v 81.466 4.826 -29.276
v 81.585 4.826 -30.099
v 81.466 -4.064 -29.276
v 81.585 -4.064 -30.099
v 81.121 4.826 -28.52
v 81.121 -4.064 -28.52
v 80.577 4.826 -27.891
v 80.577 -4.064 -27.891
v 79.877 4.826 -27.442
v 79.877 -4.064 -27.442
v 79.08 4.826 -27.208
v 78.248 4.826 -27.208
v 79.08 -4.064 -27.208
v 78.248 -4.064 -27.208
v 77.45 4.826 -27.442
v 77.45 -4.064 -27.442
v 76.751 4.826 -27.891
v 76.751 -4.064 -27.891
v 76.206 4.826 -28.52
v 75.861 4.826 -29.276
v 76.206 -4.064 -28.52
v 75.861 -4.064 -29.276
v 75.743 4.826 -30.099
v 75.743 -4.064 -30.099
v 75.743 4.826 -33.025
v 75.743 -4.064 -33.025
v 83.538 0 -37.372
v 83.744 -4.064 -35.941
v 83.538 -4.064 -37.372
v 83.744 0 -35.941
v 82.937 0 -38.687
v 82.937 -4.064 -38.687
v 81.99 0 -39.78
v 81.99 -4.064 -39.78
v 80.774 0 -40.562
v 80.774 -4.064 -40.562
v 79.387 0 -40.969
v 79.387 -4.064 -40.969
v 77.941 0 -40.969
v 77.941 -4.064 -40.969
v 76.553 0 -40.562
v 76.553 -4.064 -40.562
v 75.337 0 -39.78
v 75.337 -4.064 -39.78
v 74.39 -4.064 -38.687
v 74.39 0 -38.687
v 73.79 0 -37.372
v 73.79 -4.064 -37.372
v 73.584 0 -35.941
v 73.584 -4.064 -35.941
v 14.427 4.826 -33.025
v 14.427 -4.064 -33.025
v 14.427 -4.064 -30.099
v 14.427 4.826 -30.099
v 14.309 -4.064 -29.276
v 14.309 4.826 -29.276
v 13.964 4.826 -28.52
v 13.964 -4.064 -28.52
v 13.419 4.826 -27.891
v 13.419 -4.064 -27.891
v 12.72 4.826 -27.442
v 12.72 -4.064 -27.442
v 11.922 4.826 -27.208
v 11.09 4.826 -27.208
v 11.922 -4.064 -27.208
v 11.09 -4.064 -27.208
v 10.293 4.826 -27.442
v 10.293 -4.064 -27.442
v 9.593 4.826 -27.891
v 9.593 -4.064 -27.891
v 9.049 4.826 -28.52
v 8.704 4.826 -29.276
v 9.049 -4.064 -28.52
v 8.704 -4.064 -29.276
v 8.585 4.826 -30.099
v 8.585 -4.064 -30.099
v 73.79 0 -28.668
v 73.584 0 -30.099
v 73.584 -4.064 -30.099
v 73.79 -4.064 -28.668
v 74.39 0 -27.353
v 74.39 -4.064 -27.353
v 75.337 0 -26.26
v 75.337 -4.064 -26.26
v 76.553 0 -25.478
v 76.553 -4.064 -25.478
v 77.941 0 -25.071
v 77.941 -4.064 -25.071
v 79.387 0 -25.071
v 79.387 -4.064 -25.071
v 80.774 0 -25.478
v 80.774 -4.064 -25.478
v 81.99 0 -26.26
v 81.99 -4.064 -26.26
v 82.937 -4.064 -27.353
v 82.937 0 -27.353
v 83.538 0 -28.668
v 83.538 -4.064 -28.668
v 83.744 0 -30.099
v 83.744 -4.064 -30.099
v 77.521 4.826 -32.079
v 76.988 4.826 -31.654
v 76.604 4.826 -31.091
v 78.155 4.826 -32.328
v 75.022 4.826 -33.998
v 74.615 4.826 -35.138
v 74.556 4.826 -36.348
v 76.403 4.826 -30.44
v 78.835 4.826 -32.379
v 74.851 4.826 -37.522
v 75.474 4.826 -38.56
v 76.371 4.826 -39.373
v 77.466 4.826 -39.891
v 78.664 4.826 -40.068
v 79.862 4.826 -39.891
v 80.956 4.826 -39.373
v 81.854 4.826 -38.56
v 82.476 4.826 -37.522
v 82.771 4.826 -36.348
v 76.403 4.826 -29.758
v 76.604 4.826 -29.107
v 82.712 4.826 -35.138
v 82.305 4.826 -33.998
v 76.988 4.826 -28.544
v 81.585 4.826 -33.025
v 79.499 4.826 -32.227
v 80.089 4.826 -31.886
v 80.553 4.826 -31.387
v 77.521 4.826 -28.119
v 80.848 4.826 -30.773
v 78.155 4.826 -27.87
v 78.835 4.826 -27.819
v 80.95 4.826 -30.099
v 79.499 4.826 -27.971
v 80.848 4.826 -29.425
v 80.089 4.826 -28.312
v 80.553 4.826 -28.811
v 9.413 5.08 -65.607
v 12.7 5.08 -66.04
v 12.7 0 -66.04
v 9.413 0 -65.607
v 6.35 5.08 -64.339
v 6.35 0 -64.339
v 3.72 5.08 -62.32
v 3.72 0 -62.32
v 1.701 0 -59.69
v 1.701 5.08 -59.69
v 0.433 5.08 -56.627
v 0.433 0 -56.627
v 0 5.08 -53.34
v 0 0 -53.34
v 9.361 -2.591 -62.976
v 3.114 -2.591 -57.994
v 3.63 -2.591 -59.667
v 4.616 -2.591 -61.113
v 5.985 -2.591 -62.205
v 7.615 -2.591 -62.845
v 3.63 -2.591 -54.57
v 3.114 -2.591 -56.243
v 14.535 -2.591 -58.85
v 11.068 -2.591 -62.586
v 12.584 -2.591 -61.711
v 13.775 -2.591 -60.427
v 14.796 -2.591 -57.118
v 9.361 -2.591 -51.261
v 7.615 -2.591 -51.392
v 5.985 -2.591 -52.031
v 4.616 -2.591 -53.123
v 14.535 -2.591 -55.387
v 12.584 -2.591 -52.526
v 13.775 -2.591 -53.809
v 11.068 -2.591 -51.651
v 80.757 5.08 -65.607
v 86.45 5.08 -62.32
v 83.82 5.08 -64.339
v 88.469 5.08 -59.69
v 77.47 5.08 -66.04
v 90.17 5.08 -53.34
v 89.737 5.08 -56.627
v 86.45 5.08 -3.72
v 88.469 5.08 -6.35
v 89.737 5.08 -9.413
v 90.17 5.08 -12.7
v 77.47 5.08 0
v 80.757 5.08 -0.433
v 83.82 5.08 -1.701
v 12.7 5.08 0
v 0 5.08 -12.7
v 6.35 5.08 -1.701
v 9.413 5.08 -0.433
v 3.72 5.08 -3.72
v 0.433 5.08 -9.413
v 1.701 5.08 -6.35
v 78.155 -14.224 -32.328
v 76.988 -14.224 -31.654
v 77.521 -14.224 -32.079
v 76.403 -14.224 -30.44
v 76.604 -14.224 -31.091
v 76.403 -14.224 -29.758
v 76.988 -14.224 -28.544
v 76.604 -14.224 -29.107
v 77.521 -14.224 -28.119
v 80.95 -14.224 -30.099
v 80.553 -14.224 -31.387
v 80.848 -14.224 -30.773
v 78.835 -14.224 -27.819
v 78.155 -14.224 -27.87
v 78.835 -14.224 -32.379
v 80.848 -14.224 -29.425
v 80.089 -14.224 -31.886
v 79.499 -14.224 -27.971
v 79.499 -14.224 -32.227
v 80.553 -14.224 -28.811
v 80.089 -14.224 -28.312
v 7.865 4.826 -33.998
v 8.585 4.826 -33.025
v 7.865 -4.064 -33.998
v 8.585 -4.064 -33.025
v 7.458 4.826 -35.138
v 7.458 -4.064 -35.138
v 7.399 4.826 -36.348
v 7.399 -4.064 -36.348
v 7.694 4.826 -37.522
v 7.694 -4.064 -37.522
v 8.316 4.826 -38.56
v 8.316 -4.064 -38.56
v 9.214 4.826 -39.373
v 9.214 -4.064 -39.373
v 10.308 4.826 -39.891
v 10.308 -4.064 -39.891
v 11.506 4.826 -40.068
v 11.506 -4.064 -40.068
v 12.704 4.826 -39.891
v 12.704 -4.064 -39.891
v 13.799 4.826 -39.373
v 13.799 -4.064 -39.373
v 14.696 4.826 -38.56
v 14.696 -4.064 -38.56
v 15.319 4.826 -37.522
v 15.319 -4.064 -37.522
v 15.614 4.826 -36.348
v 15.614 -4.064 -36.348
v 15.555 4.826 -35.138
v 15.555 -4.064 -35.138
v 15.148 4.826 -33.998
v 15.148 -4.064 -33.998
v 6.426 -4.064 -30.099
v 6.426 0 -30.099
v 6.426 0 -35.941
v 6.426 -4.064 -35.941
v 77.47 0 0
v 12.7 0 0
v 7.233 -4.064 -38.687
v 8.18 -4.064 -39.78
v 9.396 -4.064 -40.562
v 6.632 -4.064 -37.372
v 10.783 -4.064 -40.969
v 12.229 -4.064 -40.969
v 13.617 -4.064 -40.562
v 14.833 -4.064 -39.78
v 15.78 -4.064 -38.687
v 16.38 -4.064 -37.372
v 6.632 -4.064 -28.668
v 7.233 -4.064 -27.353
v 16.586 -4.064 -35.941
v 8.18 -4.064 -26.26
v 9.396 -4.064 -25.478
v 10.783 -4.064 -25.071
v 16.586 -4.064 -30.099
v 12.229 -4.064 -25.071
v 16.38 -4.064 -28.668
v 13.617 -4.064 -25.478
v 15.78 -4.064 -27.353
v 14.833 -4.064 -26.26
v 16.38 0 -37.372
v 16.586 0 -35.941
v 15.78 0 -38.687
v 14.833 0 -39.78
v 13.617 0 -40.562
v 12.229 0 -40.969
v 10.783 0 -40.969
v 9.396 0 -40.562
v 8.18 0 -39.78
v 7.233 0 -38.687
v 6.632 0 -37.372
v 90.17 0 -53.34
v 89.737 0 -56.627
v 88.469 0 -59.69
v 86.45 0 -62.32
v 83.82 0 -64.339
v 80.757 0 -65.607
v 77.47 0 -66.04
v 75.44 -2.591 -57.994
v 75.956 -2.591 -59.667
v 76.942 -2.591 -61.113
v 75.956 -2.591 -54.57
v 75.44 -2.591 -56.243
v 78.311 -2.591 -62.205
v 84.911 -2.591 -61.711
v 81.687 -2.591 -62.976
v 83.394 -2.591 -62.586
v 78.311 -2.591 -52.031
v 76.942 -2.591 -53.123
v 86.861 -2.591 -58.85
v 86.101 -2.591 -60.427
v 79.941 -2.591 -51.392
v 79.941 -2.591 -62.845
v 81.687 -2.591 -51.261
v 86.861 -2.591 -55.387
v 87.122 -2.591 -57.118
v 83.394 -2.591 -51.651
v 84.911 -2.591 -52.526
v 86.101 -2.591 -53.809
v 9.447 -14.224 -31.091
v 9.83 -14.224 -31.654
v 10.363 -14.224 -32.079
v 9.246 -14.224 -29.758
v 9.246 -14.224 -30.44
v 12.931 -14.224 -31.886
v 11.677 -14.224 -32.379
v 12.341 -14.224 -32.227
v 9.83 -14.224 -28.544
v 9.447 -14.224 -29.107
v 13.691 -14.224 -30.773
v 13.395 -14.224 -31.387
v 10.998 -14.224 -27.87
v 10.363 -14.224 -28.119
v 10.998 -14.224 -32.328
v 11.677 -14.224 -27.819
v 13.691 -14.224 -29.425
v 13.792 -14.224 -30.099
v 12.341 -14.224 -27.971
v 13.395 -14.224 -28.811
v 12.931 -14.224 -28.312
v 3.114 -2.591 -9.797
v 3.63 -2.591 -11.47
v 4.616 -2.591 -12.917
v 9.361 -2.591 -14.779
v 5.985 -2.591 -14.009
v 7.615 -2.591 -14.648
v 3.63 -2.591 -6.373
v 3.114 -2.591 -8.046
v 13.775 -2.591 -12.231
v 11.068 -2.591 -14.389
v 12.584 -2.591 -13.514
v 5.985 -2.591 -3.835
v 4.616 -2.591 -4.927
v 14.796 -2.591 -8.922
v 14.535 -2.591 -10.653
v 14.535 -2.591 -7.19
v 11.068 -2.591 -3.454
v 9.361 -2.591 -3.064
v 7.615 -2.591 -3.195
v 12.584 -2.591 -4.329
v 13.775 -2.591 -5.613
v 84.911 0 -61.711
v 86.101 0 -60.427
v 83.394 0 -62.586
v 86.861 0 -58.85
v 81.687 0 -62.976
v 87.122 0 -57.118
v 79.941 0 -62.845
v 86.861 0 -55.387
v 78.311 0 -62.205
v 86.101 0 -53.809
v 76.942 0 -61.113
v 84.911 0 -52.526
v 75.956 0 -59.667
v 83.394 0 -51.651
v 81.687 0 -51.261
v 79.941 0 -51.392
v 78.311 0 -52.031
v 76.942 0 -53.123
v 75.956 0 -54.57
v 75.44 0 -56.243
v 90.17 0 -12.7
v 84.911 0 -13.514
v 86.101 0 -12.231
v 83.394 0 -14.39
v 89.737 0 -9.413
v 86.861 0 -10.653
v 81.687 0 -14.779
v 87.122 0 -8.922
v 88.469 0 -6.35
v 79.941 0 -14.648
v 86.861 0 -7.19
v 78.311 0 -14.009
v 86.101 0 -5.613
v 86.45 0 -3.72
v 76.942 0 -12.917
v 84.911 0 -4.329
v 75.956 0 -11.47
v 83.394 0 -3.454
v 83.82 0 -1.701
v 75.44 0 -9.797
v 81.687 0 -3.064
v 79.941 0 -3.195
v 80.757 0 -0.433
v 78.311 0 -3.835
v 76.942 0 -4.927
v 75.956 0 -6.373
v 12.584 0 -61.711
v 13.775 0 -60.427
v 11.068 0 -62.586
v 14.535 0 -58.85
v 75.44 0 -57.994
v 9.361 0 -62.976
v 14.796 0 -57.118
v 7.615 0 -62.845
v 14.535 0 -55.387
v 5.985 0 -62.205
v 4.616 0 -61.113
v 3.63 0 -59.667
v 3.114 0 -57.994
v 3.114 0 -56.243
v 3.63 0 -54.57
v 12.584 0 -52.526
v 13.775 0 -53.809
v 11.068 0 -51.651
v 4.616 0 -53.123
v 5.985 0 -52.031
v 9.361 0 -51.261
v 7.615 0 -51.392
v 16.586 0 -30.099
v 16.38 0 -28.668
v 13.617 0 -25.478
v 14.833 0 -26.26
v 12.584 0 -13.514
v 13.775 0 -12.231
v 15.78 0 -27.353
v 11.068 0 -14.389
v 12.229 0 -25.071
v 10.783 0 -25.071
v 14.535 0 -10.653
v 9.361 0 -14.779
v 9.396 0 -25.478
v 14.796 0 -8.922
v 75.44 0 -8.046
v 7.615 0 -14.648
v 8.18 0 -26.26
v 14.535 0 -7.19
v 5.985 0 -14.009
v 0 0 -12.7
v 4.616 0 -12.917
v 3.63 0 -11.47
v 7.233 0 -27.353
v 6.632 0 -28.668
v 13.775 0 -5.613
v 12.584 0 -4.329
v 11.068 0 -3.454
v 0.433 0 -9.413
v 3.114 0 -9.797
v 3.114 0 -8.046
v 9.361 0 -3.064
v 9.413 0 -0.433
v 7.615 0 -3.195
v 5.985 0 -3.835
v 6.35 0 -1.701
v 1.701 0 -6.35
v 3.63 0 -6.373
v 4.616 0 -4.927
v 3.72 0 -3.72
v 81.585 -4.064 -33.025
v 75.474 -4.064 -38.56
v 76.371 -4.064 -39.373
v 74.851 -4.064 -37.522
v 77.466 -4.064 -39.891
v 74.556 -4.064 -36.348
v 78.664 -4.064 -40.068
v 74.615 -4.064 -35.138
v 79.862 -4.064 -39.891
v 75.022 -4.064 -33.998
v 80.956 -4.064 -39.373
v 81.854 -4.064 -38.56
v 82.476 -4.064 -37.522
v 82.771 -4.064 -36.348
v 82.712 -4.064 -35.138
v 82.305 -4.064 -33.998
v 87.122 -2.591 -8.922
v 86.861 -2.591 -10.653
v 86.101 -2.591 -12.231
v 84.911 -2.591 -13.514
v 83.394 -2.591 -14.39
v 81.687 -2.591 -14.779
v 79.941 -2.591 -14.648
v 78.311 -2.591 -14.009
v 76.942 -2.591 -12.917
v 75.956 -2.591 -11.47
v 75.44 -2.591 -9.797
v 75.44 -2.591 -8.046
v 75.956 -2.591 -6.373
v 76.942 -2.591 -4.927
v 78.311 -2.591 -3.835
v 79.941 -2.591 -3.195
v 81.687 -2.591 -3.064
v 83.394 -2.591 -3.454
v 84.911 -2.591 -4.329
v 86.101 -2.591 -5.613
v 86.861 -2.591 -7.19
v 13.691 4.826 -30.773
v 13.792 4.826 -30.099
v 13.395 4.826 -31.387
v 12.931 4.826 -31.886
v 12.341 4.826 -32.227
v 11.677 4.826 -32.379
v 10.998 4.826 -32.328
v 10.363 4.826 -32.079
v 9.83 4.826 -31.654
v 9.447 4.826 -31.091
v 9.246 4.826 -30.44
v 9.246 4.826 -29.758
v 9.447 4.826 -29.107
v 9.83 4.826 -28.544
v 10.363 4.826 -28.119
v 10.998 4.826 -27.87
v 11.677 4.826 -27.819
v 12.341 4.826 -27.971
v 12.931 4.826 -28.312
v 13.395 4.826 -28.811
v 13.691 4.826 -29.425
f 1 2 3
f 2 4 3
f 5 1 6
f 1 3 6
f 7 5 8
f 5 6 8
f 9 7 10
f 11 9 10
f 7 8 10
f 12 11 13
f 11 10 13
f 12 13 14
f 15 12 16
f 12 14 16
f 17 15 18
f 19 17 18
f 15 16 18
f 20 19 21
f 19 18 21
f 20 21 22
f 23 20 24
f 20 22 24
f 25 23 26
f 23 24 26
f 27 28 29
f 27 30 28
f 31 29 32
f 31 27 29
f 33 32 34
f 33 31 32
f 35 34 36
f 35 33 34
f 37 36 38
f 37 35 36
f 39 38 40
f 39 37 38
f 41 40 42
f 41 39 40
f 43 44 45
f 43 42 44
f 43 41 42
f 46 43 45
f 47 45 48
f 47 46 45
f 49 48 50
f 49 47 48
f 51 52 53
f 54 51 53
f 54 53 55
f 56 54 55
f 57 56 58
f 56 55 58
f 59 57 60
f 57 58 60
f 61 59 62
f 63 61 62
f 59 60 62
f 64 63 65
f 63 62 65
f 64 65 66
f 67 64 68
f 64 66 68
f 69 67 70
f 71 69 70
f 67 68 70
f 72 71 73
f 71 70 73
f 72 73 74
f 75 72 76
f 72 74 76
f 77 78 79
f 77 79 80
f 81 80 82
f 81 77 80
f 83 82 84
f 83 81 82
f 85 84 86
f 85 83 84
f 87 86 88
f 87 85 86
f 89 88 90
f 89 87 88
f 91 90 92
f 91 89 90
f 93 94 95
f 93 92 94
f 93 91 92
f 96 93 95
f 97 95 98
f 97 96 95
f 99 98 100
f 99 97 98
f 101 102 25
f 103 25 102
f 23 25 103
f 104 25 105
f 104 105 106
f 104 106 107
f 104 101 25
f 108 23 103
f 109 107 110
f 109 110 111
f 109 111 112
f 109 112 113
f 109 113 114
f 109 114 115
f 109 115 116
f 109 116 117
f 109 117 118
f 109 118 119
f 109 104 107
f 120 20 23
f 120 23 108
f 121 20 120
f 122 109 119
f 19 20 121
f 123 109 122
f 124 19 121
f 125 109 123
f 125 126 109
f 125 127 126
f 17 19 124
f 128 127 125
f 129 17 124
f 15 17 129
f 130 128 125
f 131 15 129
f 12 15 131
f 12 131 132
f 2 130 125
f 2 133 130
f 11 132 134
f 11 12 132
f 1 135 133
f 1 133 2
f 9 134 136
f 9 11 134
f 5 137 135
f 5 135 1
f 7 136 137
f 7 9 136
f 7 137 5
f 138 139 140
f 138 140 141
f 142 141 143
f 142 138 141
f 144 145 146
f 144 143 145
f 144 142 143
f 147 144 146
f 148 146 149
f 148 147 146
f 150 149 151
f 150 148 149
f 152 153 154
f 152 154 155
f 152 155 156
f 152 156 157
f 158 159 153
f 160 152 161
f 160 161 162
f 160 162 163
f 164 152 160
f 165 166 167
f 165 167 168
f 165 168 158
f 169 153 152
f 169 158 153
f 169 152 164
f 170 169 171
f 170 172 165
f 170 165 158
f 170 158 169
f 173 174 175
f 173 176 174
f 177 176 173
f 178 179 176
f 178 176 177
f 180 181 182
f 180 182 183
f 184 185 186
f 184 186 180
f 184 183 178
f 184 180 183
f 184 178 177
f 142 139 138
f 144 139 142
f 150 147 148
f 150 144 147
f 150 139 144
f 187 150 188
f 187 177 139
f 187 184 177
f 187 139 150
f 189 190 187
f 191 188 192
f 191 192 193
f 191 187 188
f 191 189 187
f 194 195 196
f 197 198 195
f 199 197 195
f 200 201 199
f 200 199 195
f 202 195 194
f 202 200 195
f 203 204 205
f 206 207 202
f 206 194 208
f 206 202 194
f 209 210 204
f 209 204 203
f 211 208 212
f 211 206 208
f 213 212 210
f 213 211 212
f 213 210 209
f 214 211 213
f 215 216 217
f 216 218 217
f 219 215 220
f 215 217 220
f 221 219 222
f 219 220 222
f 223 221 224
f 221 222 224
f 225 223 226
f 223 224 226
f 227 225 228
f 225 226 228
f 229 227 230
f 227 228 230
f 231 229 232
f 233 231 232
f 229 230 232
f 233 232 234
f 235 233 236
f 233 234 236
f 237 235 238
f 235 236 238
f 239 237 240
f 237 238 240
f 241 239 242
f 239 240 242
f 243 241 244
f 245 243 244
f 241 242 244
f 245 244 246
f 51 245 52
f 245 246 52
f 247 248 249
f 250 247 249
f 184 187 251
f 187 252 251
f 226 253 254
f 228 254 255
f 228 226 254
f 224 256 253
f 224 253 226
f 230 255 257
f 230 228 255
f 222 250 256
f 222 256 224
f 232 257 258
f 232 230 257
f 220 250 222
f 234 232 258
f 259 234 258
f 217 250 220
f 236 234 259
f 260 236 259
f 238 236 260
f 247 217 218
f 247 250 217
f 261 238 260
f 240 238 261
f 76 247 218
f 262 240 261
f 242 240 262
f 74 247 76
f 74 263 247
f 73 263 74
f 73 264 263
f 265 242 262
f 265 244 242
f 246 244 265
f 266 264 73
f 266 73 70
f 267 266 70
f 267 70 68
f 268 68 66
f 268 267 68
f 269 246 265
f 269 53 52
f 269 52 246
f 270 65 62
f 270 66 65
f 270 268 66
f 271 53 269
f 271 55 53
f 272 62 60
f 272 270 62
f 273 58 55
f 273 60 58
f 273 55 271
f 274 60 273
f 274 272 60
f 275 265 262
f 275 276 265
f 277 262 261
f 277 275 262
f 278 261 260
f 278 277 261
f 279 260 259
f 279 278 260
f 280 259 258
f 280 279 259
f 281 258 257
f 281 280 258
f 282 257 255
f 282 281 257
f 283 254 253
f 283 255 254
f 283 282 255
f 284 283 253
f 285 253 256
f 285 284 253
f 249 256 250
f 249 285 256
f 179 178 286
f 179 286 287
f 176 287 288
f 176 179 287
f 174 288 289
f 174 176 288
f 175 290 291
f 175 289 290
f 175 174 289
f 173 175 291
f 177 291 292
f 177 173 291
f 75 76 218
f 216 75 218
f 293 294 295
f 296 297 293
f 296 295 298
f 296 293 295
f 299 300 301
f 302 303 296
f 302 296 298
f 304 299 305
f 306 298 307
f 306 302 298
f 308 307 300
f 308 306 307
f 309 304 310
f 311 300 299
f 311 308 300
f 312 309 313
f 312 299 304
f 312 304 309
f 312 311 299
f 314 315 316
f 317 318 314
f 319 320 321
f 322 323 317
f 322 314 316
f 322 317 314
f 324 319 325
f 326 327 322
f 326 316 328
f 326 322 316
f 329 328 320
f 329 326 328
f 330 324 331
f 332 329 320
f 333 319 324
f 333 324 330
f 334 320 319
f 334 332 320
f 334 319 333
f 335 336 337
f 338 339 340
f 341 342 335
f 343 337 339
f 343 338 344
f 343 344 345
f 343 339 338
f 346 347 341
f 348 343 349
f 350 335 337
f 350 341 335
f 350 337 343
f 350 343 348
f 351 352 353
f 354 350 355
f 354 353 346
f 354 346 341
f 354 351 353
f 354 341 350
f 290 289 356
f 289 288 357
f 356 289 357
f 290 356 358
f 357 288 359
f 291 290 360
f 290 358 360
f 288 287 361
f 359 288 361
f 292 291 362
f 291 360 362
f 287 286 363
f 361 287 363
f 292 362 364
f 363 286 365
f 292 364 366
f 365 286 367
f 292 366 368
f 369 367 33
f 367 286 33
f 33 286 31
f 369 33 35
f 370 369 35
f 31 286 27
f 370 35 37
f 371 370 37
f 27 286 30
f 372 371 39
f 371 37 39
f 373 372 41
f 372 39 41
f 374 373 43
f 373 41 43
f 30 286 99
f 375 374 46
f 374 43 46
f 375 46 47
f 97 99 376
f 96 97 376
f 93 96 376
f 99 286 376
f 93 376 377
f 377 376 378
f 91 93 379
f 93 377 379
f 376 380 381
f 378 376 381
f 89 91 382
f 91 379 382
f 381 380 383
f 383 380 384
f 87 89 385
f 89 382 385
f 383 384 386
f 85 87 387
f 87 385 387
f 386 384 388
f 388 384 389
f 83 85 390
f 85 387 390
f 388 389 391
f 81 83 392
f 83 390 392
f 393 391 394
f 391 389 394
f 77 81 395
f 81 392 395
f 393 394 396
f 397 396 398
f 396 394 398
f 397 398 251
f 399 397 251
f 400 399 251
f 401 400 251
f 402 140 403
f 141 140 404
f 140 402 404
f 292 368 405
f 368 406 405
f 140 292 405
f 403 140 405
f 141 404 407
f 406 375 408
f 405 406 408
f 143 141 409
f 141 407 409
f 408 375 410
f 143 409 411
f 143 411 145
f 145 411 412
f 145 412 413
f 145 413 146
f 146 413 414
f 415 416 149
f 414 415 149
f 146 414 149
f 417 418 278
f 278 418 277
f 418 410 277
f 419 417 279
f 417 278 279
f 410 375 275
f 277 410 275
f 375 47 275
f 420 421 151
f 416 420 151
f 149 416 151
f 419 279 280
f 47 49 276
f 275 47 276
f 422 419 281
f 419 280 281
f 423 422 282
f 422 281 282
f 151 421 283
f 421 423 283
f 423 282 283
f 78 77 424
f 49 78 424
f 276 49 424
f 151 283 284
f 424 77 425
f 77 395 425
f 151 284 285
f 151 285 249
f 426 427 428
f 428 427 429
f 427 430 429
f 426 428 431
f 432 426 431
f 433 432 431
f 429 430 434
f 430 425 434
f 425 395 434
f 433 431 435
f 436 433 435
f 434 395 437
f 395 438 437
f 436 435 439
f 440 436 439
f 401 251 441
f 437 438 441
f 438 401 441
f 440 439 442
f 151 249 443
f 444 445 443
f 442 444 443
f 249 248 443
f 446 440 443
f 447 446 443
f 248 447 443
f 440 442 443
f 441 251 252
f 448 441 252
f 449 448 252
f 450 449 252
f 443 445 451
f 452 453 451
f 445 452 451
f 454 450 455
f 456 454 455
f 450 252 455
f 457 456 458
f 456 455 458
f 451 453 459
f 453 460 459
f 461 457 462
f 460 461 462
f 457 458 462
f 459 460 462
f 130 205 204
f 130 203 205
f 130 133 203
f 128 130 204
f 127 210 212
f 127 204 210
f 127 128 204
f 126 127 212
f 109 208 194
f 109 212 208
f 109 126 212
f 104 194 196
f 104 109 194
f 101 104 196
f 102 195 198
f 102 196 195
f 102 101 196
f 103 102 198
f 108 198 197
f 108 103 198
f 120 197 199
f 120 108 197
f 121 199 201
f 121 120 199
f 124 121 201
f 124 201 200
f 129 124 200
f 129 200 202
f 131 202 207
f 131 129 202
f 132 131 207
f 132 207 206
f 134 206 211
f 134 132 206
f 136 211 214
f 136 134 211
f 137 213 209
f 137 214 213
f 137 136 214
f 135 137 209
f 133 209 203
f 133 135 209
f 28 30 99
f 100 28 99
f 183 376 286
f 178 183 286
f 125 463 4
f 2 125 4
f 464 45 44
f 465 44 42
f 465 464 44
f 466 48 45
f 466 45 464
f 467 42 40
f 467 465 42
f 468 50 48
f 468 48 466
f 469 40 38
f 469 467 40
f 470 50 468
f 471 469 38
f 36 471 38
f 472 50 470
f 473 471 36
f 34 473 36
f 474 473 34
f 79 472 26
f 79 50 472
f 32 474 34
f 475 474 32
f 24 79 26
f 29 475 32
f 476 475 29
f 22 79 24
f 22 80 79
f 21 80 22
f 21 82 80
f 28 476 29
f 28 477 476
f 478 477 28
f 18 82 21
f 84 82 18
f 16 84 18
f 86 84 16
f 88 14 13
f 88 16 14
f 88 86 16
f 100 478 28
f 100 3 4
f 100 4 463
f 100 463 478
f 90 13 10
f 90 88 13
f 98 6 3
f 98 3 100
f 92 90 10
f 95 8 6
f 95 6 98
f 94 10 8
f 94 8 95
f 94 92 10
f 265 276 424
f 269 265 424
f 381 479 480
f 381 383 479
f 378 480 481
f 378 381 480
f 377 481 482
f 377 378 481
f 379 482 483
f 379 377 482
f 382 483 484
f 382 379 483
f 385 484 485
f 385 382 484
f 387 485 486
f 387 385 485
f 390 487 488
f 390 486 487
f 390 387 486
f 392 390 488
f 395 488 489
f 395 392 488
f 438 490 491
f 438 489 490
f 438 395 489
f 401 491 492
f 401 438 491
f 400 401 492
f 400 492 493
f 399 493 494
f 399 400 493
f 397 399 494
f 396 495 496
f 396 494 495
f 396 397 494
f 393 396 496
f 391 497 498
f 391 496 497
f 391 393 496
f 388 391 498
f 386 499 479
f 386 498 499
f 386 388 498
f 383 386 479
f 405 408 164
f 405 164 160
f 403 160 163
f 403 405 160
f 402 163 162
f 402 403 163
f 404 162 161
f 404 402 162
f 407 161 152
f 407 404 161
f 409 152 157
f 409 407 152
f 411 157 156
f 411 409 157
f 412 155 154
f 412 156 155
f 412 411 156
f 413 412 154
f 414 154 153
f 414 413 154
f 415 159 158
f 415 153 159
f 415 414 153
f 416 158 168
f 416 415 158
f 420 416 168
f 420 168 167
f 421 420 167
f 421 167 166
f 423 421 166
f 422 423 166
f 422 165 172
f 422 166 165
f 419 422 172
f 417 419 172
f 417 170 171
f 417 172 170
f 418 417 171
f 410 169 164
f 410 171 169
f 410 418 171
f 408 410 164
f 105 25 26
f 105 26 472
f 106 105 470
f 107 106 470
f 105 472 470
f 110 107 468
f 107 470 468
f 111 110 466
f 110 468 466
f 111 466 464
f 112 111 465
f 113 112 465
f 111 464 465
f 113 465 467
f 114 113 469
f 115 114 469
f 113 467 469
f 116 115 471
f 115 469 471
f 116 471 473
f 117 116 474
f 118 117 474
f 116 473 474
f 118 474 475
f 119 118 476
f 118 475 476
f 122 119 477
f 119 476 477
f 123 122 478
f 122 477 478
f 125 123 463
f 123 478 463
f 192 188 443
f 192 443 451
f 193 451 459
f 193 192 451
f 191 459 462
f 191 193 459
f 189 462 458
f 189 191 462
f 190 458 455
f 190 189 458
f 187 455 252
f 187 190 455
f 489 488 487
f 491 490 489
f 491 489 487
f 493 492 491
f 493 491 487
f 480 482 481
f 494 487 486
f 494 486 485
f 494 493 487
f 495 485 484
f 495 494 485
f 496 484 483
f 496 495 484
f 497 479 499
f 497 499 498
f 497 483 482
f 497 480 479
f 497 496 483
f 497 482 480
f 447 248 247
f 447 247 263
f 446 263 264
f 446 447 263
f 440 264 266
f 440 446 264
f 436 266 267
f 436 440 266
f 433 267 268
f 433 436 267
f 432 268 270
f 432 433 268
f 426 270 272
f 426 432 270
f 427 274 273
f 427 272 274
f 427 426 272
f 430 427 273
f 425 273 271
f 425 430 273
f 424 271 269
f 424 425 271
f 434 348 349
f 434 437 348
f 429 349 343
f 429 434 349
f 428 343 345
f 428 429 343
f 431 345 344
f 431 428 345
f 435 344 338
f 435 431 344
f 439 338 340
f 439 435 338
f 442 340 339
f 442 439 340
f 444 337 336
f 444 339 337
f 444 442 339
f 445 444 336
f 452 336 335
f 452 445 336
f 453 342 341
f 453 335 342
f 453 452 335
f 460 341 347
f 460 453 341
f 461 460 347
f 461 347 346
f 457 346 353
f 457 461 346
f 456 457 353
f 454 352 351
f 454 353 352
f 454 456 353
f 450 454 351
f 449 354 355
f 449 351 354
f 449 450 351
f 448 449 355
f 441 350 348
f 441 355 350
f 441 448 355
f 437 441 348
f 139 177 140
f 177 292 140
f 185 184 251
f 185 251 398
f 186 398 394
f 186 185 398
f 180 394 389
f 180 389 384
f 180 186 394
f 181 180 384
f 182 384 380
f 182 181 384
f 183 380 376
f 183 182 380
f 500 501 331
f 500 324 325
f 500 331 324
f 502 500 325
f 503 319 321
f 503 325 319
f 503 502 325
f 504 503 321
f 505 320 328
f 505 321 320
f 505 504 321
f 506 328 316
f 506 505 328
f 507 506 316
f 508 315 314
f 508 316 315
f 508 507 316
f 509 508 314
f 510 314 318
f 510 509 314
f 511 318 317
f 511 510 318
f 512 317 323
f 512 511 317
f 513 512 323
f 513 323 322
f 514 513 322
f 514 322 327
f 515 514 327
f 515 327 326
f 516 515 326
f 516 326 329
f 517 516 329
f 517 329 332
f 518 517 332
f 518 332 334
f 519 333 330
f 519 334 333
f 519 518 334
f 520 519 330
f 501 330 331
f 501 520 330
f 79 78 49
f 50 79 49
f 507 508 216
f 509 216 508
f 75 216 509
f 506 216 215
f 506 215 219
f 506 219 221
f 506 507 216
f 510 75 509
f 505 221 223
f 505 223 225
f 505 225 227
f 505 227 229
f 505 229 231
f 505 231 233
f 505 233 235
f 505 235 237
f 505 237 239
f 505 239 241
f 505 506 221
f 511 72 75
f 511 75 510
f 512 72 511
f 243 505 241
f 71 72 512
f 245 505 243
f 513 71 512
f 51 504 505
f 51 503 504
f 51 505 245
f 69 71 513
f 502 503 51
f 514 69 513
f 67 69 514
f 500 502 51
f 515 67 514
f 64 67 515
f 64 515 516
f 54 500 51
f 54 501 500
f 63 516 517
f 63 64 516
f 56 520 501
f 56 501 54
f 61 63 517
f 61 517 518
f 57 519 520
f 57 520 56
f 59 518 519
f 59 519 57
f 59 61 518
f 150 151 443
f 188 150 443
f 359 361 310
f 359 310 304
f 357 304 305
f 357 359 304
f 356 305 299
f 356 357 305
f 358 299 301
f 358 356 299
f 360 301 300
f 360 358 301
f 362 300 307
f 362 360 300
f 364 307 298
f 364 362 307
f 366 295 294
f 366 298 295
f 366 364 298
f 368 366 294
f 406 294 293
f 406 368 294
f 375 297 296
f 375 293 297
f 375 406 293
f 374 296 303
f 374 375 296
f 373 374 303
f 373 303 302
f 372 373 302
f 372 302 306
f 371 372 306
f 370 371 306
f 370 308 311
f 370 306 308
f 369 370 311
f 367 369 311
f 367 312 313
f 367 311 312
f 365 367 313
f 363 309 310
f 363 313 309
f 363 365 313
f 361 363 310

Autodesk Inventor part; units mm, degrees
ref_plane "YZ Plane" through (0, 0, 0) normal (1, 0, 0) x (0, 1, 0)
ref_plane "XZ Plane" through (0, 0, 0) normal (0, 1, 0) x (-1, 0, 0)
ref_plane "XY Plane" through (0, 0, 0) normal (0, 0, 1) x (1, 0, 0)
sketch "Sketch1" plane through (0, 0, 0) normal (0, 1, 0) x (-1, 0, 0)
  line L0 (0, 0) -> (-90.17, 0)
  line L1 (-90.17, 0) -> (-90.17, -66.04)
  line L2 (-90.17, -66.04) -> (0, -66.04)
  line L3 (0, -66.04) -> (0, 0)
  dimension "d0" = 90.17
  dimension "d1" = 66.04
extrude "Extrusion1" add sketch "Sketch1" along normal blind 5.08
sketch "Sketch2" plane through (0, 0, 0) normal (0, -1, 0) x (1, 0, 0)
  circle A0 centre (8.9218, -8.9217) radius 5.8738
  circle A1 centre (81.2483, -8.9218) radius 5.8738
  circle A2 centre (8.9217, -57.1183) radius 5.8738
  circle A3 centre (81.2483, -57.1183) radius 5.8738
  line L0 (0, 0) -> (90.17, 0) projected
  line L1 (0, -66.04) -> (0, 0) projected
  line L2 (90.17, -66.04) -> (0, -66.04) projected
  line L3 (90.17, 0) -> (90.17, -66.04) projected
  dimension "d4" = 11.7475
  dimension "d5" = 3.048
  dimension "d6" = 3.048
  dimension "d7" = 3.048
  dimension "d8" = 3.048
extrude "Extrusion2" add sketch "Sketch2" along normal blind 2.5908 contours A0 | A1 | A2 | A3
sketch "Sketch3" plane through (0, 0, 0) normal (0, -1, 0) x (1, 0, 0)
  line L0 (78.6638, -30.099) -> (78.6638, -35.941) construction
  line L1 (73.5838, -30.099) -> (73.5838, -35.941)
  line L2 (83.7438, -35.941) -> (83.7438, -30.099)
  arc A0 (83.7438, -30.099) -> (73.5838, -30.099) centre (78.6638, -30.099) ccw
  arc A1 (73.5838, -35.941) -> (83.7438, -35.941) centre (78.6638, -35.941) ccw
  line L3 (11.5062, -30.099) -> (11.5062, -35.941) construction
  line L4 (6.4262, -30.099) -> (6.4262, -35.941)
  line L5 (16.5862, -35.941) -> (16.5862, -30.099)
  arc A2 (16.5862, -30.099) -> (6.4262, -30.099) centre (11.5062, -30.099) ccw
  arc A3 (6.4262, -35.941) -> (16.5862, -35.941) centre (11.5062, -35.941) ccw
  line L6 (90.17, 0) -> (90.17, -66.04) projected
  line L7 (0, -66.04) -> (0, 0) projected
  point P0 (78.6638, -33.02)
  point P1 (11.5062, -33.02)
  point P2 (90.17, -33.02)
  dimension "d11" = 6.4262
  dimension "d12" = 10.16
  dimension "d14" = 6.4262
  dimension "d15" = 16.002
extrude "Extrusion3" add sketch "Sketch3" along normal blind 4.064
sketch "Sketch4" plane through (0, -4.064, 0) normal (0, -1, 0) x (1, 0, 0)
  point P0 (0, 0)
sketch "Sketch5" plane through (0, -4.064, 0) normal (0, -1, 0) x (1, 0, 0)
  circle A0 centre (78.6638, -35.941) radius 4.1275
  circle A1 centre (11.5062, -35.941) radius 4.1275
  arc A2 (6.4262, -35.941) -> (16.5862, -35.941) centre (11.5062, -35.941) ccw projected
  arc A3 (73.5838, -35.941) -> (83.7438, -35.941) centre (78.6638, -35.941) ccw projected
  line L0 (11.5062, -35.941) -> (11.5062, -30.099) construction
  line L1 (14.4272, -35.941) -> (14.4272, -30.099)
  line L2 (8.5852, -30.099) -> (8.5852, -35.941)
  arc A4 (8.5852, -35.941) -> (14.4272, -35.941) centre (11.5062, -35.941) ccw
  arc A5 (14.4272, -30.099) -> (8.5852, -30.099) centre (11.5062, -30.099) ccw
  line L3 (78.6638, -35.941) -> (78.6638, -30.099) construction
  line L4 (81.5848, -35.941) -> (81.5848, -30.099)
  line L5 (75.7428, -30.099) -> (75.7428, -35.941)
  arc A6 (75.7428, -35.941) -> (81.5848, -35.941) centre (78.6638, -35.941) ccw
  arc A7 (81.5848, -30.099) -> (75.7428, -30.099) centre (78.6638, -30.099) ccw
  arc A8 (16.5862, -30.099) -> (6.4262, -30.099) centre (11.5062, -30.099) ccw projected
  point P0 (0, 0)
  point P1 (11.5062, -33.02)
  point P2 (78.6638, -33.02)
  dimension "d18" = 5.842
  dimension "d19" = 8.255
extrude "Extrusion4" cut sketch "Sketch5" against normal blind 8.89
fillet "Fillet1" radius 12.7 4 edges at (90.17, 2.54, 0) (90.17, 2.54, -66.04) (0, 2.54, 0) (0, 2.54, -66.04)
sketch "Sketch6" plane through (0, 4.826, 0) normal (0, -1, 0) x (1, 0, 0)
  circle A0 centre (11.5062, -30.099) radius 2.286
  arc A1 (14.4272, -30.099) -> (8.5852, -30.099) centre (11.5062, -30.099) ccw projected
  circle A2 centre (78.6638, -30.099) radius 2.286
  arc A3 (81.5848, -30.099) -> (75.7428, -30.099) centre (78.6638, -30.099) ccw projected
  point P0 (0, 0)
  dimension "d23" = 4.572
  dimension "d24" = 4.572
extrude "Extrusion5" add sketch "Sketch6" along normal blind 19.05
equation "\"d6\" = d5"
equation "\"d7\" = d5"
equation "\"d8\" = d5"
equation "\"d14\" = d11"
properties part number "Router Bottom"
